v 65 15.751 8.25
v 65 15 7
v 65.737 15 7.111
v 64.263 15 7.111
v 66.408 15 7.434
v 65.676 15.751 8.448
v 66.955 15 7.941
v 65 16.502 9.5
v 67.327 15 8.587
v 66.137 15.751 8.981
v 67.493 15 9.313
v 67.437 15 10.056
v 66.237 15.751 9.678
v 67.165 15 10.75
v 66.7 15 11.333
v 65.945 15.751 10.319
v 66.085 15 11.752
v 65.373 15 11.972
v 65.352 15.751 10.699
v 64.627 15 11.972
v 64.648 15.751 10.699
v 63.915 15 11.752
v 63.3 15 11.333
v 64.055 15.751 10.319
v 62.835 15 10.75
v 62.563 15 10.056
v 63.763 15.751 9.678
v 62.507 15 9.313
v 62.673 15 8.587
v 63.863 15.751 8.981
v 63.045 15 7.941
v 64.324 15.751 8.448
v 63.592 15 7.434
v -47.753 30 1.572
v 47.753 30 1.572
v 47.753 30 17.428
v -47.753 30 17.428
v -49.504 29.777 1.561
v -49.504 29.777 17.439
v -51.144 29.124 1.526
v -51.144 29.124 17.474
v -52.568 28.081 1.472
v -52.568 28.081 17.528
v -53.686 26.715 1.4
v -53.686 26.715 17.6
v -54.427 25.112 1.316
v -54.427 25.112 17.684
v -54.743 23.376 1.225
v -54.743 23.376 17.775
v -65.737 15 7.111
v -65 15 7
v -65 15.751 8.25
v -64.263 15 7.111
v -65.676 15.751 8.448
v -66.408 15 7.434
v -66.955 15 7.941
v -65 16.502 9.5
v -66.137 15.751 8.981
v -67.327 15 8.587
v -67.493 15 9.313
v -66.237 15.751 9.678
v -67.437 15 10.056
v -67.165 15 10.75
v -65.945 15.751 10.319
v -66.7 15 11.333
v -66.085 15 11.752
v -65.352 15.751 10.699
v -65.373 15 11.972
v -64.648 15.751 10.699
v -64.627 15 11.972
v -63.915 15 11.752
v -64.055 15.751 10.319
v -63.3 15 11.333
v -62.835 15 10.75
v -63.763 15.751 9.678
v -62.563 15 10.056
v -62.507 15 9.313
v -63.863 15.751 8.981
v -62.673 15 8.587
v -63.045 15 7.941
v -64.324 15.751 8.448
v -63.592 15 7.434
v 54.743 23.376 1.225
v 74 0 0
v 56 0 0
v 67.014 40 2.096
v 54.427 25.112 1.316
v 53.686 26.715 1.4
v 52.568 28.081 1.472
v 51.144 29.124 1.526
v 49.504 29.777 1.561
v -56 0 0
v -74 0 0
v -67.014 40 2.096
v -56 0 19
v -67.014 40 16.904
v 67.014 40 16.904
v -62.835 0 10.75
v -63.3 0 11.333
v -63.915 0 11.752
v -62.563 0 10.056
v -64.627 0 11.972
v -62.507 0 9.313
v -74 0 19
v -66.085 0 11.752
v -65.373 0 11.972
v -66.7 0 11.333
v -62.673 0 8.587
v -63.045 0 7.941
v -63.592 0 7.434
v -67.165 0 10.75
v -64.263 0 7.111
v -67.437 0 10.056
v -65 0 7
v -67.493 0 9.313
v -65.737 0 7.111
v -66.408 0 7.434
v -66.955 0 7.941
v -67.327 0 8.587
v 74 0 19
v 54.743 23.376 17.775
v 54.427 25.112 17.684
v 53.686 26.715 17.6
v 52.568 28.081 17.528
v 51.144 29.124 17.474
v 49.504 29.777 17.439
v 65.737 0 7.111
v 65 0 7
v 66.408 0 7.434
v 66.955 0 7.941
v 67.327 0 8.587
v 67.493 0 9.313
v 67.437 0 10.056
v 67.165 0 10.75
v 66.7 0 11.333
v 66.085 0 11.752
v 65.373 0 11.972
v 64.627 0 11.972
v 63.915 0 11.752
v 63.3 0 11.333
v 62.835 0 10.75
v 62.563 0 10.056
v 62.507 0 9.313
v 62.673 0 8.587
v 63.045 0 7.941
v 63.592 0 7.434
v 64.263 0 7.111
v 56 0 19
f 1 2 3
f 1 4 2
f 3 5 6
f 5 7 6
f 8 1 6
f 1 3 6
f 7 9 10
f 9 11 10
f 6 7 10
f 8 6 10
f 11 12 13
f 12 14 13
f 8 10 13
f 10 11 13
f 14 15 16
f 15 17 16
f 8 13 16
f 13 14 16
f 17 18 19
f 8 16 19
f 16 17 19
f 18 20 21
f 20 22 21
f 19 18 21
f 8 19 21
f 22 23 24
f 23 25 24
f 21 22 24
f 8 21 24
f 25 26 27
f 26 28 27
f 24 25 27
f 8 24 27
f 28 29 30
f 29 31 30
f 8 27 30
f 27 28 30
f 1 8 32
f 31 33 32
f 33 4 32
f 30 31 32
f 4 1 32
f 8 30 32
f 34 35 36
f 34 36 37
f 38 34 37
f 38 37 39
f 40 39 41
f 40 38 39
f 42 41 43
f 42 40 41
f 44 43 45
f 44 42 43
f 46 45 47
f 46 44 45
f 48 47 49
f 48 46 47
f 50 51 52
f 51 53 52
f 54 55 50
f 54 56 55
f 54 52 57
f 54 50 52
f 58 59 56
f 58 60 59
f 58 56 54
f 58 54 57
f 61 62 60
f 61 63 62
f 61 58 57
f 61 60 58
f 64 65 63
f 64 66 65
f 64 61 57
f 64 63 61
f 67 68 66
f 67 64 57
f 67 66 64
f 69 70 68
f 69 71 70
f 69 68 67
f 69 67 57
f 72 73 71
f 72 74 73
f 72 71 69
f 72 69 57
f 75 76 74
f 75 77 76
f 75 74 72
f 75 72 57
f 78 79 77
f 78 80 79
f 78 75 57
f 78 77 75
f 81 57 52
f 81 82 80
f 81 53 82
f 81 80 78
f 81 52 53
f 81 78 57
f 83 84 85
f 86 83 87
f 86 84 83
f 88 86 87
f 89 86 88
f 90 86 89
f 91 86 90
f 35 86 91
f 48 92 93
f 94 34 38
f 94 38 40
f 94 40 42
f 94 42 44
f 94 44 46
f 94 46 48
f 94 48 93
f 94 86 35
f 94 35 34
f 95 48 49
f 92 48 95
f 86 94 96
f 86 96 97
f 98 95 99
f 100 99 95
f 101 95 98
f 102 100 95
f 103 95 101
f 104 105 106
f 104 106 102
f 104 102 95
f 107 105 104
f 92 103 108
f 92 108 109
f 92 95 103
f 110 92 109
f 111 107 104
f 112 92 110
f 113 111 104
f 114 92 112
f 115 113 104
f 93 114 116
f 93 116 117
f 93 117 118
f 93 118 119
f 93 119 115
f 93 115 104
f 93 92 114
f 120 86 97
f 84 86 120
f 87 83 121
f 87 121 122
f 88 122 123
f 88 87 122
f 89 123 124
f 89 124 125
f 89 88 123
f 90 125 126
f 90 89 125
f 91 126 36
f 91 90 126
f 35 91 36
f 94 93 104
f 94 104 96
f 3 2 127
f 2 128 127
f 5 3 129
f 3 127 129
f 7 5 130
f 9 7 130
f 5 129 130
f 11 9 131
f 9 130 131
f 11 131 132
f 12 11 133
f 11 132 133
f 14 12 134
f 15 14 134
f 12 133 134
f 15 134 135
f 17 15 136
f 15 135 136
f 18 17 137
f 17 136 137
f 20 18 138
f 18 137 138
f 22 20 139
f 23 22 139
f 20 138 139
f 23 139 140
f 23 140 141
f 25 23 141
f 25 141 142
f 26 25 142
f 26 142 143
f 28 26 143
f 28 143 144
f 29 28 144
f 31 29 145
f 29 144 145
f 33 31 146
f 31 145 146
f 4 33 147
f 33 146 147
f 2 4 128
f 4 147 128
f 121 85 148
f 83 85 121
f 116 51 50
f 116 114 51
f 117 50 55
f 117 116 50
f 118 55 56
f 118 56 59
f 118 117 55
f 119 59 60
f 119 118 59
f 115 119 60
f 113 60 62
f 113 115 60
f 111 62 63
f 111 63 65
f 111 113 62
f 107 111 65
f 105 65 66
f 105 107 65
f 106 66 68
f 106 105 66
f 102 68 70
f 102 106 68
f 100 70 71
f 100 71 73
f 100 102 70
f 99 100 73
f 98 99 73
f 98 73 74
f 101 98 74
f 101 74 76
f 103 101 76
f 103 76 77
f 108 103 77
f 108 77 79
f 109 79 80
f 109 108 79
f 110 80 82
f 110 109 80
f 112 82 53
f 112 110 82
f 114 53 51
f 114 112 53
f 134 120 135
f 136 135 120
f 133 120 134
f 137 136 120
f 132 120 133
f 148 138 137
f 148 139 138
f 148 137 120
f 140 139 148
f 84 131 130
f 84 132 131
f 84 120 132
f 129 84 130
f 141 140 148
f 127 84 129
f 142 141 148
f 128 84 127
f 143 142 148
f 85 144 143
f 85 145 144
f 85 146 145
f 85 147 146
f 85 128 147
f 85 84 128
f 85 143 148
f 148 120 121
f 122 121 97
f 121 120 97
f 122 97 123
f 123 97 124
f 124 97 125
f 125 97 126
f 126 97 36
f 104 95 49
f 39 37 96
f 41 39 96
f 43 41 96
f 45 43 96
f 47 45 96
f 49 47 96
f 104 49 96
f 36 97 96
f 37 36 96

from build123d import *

# Parameters (mm, degrees)
BOSS_EXTRUDE1_DEPTH = 19
DRAFT1_ANGLE        = 3


with BuildPart() as part:
    # Sketch1 → Boss-Extrude1 (new body)
    with BuildSketch(Plane.XY):
        with BuildLine():
            Line((-74, 0), (-67.013633203, 40))
            Line((-67.013633203, 40), (67.013633203, 40))
            Line((67.013633203, 40), (74, 0))
            Line((74, 0), (56, 0))
            Line((56, 0), (54.743185165, 23.37581641))
            ThreePointArc((54.743185165, 23.37581641), (52.568324233, 28.080881561), (47.753280872, 30))
            Line((47.753280872, 30), (-47.753280872, 30))
            ThreePointArc((-47.753280872, 30), (-52.568324233, 28.080881561), (-54.743185165, 23.37581641))
            Line((-54.743185165, 23.37581641), (-56, 0))
            Line((-56, 0), (-74, 0))
        make_face()
    extrude(amount=BOSS_EXTRUDE1_DEPTH)

    # Draft1
    draft1_faces = [part.faces().sort_by_distance(p)[0] for p in [
        (-68.996577663, 19.736222921, 0),
        (-68.996577663, 19.736222921, 19),
    ]]
    draft(draft1_faces, Plane.ZX, DRAFT1_ANGLE)

    # Sketch3 → M6x1.0 Tapped Hole1 (revolve, cut)
    with BuildSketch(Plane(origin=(-65, 0, 9.5), x_dir=(0, 0, -1), z_dir=(1, 0, 0))):
        Polygon((0, 0), (0, 16.502151548), (2.5, 15), (2.5, 0), align=None)
    m6x1_0_tapped_hole1 = revolve(axis=Axis((-65, -6.35, 9.5), (0, 1, 0)), mode=Mode.SUBTRACT)

    # Mirror1: M6x1.0 Tapped Hole1 across plane
    add(m6x1_0_tapped_hole1.mirror(Plane(origin=(0, 0, 0), x_dir=(0, 0, 1), z_dir=(1, 0, 0))), mode=Mode.SUBTRACT)


solid = part.part
